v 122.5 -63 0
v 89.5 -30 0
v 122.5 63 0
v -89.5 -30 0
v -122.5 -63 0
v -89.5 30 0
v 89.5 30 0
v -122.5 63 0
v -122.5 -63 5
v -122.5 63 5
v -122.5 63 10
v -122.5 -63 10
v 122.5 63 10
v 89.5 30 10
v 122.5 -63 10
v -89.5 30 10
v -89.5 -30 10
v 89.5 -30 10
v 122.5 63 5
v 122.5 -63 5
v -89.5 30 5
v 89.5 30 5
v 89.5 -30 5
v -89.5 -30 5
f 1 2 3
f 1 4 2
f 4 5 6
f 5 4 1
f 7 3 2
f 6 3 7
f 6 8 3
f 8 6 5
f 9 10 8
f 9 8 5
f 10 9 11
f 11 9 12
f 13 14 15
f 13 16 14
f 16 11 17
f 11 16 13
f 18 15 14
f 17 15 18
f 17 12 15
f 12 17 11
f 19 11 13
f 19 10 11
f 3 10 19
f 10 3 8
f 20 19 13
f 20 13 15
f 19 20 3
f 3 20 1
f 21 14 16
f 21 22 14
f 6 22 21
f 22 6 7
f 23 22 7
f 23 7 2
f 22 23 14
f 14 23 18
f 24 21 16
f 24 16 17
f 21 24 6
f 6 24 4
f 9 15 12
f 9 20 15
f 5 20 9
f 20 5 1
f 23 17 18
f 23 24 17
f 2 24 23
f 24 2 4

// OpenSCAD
// file: ../../constants.scad
/********************
* Table of Contents *
* *******************/
// 1. Materials
// 2. Rear Standard
    // 2.1 Rear Standard Carrier
    // 2.2 Rear Standard Housing
    // 2.3 Rear Standard Tilt Plate
// 3. Front Standard
// 4. Base
// 5. Ground Glass
// 6. Film Cassette



/****************
* 1. Materials  *
* **************/
    sheet_metal_thickness_structural = 2;
    screw_hole_metric_3 = 3;
    screw_hole_metric_4 = 4;
    screw_hole_metric_5 = 5;
    screw_hole_metric_6 = 6;

/********************
* 2. Rear Standard  *
* *******************/

    // 2.1 Rear Standard Carrier
    rear_standard_carrier_thickness = sheet_metal_thickness_structural;
    rear_standard_carrier_width = 26;
    rear_standard_carrier_base_length = 258.5;
    rear_standard_carrier_base_flat_length = 30.25;
    rear_standard_carrier_base_slot_length = 160;
    rear_standard_carrier_base_slot_width = 6;
    rear_standard_carrier_upright_length = 149;
    rear_standard_carrier_upright_slot_width = 6;
    rear_standard_carrier_screw_hole_diameter = screw_hole_metric_4;
    rear_standard_carrier_screw_hole_triangle_side_length = (rear_standard_carrier_width / 3) + rear_standard_carrier_screw_hole_diameter;
    rear_standard_carrier_screw_hole_triangle_height = (rear_standard_carrier_screw_hole_triangle_side_length * sqrt(3)) / 2;
    rear_standard_carrier_screw_hole_triangle_top_margin = 5;

    // 2.2 Rear Standard Housing
    rear_standard_housing_width = 245;
    rear_standard_housing_height = 126;
    rear_standard_housing_depth = 30;
    rear_standard_housing_thickness = 10;
    rear_standard_housing_frame_width = 33;
    rear_standard_housing_tilt_slot_additional_width = 2; // screw head diameter + small margin - rear_standard_tilt_slot_width


    // 2.3 Rear Standard Tilt Plate
    rear_standard_tilt_slot_radius = 45;
    rear_standard_tilt_slot_width = 5;
    rear_standard_tilt_slot_range = 50;
    rear_standard_tilt_slot_rotational_offset = 5;
// main file
include <../../constants.scad>

module rear_standard_housing_frame_side_long() {
    difference() {
        linear_extrude(height = rear_standard_housing_thickness) {
            square(size = [rear_standard_housing_width, rear_standard_housing_frame_width], center = true);
        }
        half_lap_cutout_offset_x = rear_standard_housing_width / 2 - rear_standard_housing_frame_width / 2;
        translate(v = [half_lap_cutout_offset_x,0,rear_standard_housing_thickness / 2]) {
            linear_extrude(height = rear_standard_housing_thickness) {
                square(size = [rear_standard_housing_frame_width,rear_standard_housing_frame_width], center = true);
            } 
        }
        mirror(v = [1,0,0]) {
            translate(v = [half_lap_cutout_offset_x,0,rear_standard_housing_thickness / 2]) {
                linear_extrude(height = rear_standard_housing_thickness) {
                    square(size = [rear_standard_housing_frame_width,rear_standard_housing_frame_width], center = true);
                } 
            }   
        }
    }
}

module rear_standard_housing_frame_side_short() {
    difference() {
        linear_extrude(height = rear_standard_housing_thickness) {
            square(size = [rear_standard_housing_height,rear_standard_housing_frame_width], center = true);
        }
        half_lap_cutout_offset_x = rear_standard_housing_height / 2 - rear_standard_housing_frame_width / 2;
        translate(v = [half_lap_cutout_offset_x,0,rear_standard_housing_thickness / 2]) {
            linear_extrude(height = rear_standard_housing_thickness) {
                square(size = [rear_standard_housing_frame_width,rear_standard_housing_frame_width], center = true);
            }
        }
        mirror(v = [1,0,0]) {
            translate(v = [half_lap_cutout_offset_x,0,rear_standard_housing_thickness / 2]) {
            linear_extrude(height = rear_standard_housing_thickness) {
                square(size = [rear_standard_housing_frame_width,rear_standard_housing_frame_width], center = true);
            }
        }
        } 
    }
}

module rear_standard_housing_frame() {
    frame_offset_y = rear_standard_housing_height / 2 - rear_standard_housing_frame_width / 2;
    translate(v = [0,frame_offset_y,0]) {
        rear_standard_housing_frame_side_long();
    } 
    mirror(v = [0,1,0]) {
        translate(v = [0,frame_offset_y,0]) {
            rear_standard_housing_frame_side_long();
        } 
    }

    frame_offset_x = rear_standard_housing_width / 2 - rear_standard_housing_frame_width / 2;
    translate(v = [frame_offset_x,0,rear_standard_housing_thickness]) {
        rotate(a = [180,0,90]) {
            rear_standard_housing_frame_side_short();
        } 
    } 
    mirror(v = [1,0,0]) {
        translate(v = [frame_offset_x,0,rear_standard_housing_thickness]) {
            rotate(a = [180,0,90]) {
                rear_standard_housing_frame_side_short();
            } 
        } 
    }
}

rear_standard_housing_frame();
